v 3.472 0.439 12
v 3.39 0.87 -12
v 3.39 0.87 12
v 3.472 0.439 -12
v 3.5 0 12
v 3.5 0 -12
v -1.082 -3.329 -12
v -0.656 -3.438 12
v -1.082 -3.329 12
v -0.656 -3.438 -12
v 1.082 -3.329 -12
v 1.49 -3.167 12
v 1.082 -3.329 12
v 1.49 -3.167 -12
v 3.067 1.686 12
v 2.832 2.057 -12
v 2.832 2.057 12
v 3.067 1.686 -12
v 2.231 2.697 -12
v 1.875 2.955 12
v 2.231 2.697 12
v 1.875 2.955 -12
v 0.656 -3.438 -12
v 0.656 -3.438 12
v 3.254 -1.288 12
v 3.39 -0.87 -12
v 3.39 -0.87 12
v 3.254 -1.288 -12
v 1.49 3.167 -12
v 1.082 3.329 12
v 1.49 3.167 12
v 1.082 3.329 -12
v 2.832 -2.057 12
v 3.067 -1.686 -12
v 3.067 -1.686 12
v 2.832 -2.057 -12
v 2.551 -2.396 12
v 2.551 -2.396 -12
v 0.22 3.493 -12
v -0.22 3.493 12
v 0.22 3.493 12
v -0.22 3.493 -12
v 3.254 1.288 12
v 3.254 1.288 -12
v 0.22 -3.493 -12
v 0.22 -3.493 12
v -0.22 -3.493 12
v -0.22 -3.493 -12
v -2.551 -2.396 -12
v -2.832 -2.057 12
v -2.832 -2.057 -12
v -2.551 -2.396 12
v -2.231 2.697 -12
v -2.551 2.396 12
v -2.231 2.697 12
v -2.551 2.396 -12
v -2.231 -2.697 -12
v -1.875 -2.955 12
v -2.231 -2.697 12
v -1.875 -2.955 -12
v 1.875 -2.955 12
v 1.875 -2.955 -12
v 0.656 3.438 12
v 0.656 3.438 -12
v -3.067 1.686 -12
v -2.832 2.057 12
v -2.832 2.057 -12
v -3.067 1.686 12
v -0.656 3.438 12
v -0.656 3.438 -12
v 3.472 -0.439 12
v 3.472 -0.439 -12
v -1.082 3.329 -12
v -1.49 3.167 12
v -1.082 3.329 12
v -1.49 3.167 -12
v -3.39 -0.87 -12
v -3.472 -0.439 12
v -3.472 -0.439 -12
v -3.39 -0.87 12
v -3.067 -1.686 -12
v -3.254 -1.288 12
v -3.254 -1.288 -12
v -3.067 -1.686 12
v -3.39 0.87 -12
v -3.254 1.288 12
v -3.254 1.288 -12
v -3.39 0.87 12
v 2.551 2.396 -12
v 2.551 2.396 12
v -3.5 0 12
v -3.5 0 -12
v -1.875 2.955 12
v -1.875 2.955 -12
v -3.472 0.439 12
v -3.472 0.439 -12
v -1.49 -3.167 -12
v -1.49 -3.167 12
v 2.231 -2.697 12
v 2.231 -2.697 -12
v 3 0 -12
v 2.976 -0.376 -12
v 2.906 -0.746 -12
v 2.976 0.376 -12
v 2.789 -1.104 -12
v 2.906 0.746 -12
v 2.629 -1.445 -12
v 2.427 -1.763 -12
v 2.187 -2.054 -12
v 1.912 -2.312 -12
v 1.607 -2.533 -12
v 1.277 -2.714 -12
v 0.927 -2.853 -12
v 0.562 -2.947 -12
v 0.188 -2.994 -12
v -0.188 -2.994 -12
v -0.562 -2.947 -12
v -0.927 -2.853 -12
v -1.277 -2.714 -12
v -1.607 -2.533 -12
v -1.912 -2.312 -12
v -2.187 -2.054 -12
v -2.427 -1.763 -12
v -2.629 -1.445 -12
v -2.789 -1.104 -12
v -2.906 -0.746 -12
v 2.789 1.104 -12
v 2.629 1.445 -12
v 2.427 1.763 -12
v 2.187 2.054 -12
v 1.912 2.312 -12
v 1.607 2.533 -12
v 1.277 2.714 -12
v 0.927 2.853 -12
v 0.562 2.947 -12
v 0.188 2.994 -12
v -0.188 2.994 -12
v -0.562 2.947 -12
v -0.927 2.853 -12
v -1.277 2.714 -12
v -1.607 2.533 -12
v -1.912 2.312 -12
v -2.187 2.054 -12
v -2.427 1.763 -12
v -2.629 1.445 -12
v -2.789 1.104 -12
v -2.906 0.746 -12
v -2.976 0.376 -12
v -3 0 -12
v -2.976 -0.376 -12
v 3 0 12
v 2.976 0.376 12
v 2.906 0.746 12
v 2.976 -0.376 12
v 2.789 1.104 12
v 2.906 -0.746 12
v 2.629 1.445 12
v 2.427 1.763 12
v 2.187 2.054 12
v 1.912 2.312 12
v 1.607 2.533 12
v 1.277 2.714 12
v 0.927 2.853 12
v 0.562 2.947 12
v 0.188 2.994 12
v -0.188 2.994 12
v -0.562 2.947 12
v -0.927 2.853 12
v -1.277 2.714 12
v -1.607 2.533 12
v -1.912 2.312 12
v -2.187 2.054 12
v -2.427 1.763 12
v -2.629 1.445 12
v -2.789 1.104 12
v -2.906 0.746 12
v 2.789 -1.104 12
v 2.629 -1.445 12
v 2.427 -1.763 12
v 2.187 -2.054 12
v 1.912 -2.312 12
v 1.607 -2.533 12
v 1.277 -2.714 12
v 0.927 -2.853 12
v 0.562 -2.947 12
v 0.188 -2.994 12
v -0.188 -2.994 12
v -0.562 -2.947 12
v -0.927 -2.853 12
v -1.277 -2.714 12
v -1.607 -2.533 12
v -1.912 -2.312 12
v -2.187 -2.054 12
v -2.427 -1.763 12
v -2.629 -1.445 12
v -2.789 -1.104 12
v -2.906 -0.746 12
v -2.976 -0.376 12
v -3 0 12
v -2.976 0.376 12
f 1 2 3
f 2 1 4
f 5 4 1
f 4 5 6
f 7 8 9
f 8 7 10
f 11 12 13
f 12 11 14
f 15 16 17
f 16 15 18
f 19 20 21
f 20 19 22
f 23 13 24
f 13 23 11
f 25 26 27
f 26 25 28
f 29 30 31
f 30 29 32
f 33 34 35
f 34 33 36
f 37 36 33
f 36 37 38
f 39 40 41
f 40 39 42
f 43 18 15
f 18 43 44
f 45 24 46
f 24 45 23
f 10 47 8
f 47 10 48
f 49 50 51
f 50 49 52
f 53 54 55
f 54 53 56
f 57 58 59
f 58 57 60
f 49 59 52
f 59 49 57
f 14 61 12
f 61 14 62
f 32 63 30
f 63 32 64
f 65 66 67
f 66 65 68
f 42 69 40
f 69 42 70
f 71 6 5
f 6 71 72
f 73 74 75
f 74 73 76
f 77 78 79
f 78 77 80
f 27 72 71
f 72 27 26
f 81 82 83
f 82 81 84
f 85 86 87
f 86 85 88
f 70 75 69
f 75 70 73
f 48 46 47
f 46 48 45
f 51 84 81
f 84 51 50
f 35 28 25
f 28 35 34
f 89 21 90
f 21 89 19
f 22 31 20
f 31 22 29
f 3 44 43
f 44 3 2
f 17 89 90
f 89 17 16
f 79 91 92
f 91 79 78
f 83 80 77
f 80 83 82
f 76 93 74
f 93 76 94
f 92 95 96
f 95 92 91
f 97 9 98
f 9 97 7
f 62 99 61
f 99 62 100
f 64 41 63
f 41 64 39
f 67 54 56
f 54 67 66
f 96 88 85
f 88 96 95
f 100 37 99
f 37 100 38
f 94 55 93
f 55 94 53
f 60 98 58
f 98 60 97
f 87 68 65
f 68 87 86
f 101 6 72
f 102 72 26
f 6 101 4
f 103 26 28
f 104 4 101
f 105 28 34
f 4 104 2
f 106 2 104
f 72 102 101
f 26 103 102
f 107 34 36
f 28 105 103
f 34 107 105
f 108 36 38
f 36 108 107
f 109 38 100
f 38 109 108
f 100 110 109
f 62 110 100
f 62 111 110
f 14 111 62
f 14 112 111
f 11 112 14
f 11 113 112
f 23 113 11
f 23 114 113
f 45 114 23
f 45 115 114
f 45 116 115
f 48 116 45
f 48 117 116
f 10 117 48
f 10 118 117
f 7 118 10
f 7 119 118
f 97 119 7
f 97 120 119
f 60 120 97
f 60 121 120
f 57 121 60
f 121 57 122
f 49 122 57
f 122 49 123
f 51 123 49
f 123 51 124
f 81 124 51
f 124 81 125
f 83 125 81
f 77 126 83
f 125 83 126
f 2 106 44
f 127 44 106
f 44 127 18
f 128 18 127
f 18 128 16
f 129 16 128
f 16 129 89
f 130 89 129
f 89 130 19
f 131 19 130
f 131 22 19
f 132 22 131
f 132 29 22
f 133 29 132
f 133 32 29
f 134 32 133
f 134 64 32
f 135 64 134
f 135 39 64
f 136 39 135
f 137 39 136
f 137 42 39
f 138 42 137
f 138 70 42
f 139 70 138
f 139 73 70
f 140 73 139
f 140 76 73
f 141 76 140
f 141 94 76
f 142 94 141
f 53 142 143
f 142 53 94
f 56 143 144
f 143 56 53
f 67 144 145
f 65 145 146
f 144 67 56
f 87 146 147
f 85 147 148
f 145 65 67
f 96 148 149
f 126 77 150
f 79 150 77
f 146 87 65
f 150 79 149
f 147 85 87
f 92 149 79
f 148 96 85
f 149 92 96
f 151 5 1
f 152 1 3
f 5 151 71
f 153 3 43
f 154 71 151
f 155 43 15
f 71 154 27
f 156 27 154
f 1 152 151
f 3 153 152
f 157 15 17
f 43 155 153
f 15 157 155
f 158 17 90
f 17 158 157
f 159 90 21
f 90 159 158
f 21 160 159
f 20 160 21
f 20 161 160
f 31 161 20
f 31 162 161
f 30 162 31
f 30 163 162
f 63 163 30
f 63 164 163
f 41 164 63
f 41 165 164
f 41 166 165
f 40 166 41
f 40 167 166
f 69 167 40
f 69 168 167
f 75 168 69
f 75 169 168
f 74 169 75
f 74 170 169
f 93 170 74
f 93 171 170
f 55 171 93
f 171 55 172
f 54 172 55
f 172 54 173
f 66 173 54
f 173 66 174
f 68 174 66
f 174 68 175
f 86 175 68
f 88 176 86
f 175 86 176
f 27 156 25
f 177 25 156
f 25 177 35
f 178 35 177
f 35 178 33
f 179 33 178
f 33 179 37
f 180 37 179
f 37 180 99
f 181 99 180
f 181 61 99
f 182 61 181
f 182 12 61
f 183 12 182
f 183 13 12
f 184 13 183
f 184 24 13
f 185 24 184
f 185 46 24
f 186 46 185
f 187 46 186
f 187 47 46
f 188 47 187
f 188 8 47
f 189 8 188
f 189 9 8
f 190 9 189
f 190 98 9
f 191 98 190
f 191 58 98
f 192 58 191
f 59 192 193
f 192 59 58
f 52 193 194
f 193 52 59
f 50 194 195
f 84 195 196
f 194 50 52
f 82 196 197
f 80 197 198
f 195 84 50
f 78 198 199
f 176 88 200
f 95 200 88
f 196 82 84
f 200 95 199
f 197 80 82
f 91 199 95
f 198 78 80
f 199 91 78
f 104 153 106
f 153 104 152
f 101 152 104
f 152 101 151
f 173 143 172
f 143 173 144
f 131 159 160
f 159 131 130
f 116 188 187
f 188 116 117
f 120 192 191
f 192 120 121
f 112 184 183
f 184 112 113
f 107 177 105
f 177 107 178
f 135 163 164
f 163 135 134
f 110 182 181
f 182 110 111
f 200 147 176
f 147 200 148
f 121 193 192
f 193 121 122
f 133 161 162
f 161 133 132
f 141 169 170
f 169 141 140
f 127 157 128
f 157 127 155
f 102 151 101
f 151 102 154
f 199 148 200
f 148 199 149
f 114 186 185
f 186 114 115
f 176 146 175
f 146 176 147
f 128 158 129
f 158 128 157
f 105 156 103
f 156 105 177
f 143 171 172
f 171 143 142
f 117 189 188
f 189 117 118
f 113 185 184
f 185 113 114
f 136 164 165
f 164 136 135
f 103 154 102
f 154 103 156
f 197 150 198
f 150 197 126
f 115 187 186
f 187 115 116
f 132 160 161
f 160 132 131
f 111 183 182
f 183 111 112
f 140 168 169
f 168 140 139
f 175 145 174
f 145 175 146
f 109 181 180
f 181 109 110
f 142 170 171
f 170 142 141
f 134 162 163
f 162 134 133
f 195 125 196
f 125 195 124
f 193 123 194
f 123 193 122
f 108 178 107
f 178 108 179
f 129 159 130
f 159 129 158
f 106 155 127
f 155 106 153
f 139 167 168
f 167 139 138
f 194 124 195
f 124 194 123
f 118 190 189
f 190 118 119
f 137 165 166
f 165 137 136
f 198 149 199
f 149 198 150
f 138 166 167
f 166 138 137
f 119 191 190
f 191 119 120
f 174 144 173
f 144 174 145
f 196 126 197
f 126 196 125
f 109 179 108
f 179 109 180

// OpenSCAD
$fn = 50;


difference() {
	union() {
		translate(v = [0, 0, -12.0000000000]) {
			cylinder(h = 24, r = 3.5000000000);
		}
	}
	union() {
		translate(v = [0, 0, -100.0000000000]) {
			cylinder(h = 200, r = 3.0000000000);
		}
	}
}
